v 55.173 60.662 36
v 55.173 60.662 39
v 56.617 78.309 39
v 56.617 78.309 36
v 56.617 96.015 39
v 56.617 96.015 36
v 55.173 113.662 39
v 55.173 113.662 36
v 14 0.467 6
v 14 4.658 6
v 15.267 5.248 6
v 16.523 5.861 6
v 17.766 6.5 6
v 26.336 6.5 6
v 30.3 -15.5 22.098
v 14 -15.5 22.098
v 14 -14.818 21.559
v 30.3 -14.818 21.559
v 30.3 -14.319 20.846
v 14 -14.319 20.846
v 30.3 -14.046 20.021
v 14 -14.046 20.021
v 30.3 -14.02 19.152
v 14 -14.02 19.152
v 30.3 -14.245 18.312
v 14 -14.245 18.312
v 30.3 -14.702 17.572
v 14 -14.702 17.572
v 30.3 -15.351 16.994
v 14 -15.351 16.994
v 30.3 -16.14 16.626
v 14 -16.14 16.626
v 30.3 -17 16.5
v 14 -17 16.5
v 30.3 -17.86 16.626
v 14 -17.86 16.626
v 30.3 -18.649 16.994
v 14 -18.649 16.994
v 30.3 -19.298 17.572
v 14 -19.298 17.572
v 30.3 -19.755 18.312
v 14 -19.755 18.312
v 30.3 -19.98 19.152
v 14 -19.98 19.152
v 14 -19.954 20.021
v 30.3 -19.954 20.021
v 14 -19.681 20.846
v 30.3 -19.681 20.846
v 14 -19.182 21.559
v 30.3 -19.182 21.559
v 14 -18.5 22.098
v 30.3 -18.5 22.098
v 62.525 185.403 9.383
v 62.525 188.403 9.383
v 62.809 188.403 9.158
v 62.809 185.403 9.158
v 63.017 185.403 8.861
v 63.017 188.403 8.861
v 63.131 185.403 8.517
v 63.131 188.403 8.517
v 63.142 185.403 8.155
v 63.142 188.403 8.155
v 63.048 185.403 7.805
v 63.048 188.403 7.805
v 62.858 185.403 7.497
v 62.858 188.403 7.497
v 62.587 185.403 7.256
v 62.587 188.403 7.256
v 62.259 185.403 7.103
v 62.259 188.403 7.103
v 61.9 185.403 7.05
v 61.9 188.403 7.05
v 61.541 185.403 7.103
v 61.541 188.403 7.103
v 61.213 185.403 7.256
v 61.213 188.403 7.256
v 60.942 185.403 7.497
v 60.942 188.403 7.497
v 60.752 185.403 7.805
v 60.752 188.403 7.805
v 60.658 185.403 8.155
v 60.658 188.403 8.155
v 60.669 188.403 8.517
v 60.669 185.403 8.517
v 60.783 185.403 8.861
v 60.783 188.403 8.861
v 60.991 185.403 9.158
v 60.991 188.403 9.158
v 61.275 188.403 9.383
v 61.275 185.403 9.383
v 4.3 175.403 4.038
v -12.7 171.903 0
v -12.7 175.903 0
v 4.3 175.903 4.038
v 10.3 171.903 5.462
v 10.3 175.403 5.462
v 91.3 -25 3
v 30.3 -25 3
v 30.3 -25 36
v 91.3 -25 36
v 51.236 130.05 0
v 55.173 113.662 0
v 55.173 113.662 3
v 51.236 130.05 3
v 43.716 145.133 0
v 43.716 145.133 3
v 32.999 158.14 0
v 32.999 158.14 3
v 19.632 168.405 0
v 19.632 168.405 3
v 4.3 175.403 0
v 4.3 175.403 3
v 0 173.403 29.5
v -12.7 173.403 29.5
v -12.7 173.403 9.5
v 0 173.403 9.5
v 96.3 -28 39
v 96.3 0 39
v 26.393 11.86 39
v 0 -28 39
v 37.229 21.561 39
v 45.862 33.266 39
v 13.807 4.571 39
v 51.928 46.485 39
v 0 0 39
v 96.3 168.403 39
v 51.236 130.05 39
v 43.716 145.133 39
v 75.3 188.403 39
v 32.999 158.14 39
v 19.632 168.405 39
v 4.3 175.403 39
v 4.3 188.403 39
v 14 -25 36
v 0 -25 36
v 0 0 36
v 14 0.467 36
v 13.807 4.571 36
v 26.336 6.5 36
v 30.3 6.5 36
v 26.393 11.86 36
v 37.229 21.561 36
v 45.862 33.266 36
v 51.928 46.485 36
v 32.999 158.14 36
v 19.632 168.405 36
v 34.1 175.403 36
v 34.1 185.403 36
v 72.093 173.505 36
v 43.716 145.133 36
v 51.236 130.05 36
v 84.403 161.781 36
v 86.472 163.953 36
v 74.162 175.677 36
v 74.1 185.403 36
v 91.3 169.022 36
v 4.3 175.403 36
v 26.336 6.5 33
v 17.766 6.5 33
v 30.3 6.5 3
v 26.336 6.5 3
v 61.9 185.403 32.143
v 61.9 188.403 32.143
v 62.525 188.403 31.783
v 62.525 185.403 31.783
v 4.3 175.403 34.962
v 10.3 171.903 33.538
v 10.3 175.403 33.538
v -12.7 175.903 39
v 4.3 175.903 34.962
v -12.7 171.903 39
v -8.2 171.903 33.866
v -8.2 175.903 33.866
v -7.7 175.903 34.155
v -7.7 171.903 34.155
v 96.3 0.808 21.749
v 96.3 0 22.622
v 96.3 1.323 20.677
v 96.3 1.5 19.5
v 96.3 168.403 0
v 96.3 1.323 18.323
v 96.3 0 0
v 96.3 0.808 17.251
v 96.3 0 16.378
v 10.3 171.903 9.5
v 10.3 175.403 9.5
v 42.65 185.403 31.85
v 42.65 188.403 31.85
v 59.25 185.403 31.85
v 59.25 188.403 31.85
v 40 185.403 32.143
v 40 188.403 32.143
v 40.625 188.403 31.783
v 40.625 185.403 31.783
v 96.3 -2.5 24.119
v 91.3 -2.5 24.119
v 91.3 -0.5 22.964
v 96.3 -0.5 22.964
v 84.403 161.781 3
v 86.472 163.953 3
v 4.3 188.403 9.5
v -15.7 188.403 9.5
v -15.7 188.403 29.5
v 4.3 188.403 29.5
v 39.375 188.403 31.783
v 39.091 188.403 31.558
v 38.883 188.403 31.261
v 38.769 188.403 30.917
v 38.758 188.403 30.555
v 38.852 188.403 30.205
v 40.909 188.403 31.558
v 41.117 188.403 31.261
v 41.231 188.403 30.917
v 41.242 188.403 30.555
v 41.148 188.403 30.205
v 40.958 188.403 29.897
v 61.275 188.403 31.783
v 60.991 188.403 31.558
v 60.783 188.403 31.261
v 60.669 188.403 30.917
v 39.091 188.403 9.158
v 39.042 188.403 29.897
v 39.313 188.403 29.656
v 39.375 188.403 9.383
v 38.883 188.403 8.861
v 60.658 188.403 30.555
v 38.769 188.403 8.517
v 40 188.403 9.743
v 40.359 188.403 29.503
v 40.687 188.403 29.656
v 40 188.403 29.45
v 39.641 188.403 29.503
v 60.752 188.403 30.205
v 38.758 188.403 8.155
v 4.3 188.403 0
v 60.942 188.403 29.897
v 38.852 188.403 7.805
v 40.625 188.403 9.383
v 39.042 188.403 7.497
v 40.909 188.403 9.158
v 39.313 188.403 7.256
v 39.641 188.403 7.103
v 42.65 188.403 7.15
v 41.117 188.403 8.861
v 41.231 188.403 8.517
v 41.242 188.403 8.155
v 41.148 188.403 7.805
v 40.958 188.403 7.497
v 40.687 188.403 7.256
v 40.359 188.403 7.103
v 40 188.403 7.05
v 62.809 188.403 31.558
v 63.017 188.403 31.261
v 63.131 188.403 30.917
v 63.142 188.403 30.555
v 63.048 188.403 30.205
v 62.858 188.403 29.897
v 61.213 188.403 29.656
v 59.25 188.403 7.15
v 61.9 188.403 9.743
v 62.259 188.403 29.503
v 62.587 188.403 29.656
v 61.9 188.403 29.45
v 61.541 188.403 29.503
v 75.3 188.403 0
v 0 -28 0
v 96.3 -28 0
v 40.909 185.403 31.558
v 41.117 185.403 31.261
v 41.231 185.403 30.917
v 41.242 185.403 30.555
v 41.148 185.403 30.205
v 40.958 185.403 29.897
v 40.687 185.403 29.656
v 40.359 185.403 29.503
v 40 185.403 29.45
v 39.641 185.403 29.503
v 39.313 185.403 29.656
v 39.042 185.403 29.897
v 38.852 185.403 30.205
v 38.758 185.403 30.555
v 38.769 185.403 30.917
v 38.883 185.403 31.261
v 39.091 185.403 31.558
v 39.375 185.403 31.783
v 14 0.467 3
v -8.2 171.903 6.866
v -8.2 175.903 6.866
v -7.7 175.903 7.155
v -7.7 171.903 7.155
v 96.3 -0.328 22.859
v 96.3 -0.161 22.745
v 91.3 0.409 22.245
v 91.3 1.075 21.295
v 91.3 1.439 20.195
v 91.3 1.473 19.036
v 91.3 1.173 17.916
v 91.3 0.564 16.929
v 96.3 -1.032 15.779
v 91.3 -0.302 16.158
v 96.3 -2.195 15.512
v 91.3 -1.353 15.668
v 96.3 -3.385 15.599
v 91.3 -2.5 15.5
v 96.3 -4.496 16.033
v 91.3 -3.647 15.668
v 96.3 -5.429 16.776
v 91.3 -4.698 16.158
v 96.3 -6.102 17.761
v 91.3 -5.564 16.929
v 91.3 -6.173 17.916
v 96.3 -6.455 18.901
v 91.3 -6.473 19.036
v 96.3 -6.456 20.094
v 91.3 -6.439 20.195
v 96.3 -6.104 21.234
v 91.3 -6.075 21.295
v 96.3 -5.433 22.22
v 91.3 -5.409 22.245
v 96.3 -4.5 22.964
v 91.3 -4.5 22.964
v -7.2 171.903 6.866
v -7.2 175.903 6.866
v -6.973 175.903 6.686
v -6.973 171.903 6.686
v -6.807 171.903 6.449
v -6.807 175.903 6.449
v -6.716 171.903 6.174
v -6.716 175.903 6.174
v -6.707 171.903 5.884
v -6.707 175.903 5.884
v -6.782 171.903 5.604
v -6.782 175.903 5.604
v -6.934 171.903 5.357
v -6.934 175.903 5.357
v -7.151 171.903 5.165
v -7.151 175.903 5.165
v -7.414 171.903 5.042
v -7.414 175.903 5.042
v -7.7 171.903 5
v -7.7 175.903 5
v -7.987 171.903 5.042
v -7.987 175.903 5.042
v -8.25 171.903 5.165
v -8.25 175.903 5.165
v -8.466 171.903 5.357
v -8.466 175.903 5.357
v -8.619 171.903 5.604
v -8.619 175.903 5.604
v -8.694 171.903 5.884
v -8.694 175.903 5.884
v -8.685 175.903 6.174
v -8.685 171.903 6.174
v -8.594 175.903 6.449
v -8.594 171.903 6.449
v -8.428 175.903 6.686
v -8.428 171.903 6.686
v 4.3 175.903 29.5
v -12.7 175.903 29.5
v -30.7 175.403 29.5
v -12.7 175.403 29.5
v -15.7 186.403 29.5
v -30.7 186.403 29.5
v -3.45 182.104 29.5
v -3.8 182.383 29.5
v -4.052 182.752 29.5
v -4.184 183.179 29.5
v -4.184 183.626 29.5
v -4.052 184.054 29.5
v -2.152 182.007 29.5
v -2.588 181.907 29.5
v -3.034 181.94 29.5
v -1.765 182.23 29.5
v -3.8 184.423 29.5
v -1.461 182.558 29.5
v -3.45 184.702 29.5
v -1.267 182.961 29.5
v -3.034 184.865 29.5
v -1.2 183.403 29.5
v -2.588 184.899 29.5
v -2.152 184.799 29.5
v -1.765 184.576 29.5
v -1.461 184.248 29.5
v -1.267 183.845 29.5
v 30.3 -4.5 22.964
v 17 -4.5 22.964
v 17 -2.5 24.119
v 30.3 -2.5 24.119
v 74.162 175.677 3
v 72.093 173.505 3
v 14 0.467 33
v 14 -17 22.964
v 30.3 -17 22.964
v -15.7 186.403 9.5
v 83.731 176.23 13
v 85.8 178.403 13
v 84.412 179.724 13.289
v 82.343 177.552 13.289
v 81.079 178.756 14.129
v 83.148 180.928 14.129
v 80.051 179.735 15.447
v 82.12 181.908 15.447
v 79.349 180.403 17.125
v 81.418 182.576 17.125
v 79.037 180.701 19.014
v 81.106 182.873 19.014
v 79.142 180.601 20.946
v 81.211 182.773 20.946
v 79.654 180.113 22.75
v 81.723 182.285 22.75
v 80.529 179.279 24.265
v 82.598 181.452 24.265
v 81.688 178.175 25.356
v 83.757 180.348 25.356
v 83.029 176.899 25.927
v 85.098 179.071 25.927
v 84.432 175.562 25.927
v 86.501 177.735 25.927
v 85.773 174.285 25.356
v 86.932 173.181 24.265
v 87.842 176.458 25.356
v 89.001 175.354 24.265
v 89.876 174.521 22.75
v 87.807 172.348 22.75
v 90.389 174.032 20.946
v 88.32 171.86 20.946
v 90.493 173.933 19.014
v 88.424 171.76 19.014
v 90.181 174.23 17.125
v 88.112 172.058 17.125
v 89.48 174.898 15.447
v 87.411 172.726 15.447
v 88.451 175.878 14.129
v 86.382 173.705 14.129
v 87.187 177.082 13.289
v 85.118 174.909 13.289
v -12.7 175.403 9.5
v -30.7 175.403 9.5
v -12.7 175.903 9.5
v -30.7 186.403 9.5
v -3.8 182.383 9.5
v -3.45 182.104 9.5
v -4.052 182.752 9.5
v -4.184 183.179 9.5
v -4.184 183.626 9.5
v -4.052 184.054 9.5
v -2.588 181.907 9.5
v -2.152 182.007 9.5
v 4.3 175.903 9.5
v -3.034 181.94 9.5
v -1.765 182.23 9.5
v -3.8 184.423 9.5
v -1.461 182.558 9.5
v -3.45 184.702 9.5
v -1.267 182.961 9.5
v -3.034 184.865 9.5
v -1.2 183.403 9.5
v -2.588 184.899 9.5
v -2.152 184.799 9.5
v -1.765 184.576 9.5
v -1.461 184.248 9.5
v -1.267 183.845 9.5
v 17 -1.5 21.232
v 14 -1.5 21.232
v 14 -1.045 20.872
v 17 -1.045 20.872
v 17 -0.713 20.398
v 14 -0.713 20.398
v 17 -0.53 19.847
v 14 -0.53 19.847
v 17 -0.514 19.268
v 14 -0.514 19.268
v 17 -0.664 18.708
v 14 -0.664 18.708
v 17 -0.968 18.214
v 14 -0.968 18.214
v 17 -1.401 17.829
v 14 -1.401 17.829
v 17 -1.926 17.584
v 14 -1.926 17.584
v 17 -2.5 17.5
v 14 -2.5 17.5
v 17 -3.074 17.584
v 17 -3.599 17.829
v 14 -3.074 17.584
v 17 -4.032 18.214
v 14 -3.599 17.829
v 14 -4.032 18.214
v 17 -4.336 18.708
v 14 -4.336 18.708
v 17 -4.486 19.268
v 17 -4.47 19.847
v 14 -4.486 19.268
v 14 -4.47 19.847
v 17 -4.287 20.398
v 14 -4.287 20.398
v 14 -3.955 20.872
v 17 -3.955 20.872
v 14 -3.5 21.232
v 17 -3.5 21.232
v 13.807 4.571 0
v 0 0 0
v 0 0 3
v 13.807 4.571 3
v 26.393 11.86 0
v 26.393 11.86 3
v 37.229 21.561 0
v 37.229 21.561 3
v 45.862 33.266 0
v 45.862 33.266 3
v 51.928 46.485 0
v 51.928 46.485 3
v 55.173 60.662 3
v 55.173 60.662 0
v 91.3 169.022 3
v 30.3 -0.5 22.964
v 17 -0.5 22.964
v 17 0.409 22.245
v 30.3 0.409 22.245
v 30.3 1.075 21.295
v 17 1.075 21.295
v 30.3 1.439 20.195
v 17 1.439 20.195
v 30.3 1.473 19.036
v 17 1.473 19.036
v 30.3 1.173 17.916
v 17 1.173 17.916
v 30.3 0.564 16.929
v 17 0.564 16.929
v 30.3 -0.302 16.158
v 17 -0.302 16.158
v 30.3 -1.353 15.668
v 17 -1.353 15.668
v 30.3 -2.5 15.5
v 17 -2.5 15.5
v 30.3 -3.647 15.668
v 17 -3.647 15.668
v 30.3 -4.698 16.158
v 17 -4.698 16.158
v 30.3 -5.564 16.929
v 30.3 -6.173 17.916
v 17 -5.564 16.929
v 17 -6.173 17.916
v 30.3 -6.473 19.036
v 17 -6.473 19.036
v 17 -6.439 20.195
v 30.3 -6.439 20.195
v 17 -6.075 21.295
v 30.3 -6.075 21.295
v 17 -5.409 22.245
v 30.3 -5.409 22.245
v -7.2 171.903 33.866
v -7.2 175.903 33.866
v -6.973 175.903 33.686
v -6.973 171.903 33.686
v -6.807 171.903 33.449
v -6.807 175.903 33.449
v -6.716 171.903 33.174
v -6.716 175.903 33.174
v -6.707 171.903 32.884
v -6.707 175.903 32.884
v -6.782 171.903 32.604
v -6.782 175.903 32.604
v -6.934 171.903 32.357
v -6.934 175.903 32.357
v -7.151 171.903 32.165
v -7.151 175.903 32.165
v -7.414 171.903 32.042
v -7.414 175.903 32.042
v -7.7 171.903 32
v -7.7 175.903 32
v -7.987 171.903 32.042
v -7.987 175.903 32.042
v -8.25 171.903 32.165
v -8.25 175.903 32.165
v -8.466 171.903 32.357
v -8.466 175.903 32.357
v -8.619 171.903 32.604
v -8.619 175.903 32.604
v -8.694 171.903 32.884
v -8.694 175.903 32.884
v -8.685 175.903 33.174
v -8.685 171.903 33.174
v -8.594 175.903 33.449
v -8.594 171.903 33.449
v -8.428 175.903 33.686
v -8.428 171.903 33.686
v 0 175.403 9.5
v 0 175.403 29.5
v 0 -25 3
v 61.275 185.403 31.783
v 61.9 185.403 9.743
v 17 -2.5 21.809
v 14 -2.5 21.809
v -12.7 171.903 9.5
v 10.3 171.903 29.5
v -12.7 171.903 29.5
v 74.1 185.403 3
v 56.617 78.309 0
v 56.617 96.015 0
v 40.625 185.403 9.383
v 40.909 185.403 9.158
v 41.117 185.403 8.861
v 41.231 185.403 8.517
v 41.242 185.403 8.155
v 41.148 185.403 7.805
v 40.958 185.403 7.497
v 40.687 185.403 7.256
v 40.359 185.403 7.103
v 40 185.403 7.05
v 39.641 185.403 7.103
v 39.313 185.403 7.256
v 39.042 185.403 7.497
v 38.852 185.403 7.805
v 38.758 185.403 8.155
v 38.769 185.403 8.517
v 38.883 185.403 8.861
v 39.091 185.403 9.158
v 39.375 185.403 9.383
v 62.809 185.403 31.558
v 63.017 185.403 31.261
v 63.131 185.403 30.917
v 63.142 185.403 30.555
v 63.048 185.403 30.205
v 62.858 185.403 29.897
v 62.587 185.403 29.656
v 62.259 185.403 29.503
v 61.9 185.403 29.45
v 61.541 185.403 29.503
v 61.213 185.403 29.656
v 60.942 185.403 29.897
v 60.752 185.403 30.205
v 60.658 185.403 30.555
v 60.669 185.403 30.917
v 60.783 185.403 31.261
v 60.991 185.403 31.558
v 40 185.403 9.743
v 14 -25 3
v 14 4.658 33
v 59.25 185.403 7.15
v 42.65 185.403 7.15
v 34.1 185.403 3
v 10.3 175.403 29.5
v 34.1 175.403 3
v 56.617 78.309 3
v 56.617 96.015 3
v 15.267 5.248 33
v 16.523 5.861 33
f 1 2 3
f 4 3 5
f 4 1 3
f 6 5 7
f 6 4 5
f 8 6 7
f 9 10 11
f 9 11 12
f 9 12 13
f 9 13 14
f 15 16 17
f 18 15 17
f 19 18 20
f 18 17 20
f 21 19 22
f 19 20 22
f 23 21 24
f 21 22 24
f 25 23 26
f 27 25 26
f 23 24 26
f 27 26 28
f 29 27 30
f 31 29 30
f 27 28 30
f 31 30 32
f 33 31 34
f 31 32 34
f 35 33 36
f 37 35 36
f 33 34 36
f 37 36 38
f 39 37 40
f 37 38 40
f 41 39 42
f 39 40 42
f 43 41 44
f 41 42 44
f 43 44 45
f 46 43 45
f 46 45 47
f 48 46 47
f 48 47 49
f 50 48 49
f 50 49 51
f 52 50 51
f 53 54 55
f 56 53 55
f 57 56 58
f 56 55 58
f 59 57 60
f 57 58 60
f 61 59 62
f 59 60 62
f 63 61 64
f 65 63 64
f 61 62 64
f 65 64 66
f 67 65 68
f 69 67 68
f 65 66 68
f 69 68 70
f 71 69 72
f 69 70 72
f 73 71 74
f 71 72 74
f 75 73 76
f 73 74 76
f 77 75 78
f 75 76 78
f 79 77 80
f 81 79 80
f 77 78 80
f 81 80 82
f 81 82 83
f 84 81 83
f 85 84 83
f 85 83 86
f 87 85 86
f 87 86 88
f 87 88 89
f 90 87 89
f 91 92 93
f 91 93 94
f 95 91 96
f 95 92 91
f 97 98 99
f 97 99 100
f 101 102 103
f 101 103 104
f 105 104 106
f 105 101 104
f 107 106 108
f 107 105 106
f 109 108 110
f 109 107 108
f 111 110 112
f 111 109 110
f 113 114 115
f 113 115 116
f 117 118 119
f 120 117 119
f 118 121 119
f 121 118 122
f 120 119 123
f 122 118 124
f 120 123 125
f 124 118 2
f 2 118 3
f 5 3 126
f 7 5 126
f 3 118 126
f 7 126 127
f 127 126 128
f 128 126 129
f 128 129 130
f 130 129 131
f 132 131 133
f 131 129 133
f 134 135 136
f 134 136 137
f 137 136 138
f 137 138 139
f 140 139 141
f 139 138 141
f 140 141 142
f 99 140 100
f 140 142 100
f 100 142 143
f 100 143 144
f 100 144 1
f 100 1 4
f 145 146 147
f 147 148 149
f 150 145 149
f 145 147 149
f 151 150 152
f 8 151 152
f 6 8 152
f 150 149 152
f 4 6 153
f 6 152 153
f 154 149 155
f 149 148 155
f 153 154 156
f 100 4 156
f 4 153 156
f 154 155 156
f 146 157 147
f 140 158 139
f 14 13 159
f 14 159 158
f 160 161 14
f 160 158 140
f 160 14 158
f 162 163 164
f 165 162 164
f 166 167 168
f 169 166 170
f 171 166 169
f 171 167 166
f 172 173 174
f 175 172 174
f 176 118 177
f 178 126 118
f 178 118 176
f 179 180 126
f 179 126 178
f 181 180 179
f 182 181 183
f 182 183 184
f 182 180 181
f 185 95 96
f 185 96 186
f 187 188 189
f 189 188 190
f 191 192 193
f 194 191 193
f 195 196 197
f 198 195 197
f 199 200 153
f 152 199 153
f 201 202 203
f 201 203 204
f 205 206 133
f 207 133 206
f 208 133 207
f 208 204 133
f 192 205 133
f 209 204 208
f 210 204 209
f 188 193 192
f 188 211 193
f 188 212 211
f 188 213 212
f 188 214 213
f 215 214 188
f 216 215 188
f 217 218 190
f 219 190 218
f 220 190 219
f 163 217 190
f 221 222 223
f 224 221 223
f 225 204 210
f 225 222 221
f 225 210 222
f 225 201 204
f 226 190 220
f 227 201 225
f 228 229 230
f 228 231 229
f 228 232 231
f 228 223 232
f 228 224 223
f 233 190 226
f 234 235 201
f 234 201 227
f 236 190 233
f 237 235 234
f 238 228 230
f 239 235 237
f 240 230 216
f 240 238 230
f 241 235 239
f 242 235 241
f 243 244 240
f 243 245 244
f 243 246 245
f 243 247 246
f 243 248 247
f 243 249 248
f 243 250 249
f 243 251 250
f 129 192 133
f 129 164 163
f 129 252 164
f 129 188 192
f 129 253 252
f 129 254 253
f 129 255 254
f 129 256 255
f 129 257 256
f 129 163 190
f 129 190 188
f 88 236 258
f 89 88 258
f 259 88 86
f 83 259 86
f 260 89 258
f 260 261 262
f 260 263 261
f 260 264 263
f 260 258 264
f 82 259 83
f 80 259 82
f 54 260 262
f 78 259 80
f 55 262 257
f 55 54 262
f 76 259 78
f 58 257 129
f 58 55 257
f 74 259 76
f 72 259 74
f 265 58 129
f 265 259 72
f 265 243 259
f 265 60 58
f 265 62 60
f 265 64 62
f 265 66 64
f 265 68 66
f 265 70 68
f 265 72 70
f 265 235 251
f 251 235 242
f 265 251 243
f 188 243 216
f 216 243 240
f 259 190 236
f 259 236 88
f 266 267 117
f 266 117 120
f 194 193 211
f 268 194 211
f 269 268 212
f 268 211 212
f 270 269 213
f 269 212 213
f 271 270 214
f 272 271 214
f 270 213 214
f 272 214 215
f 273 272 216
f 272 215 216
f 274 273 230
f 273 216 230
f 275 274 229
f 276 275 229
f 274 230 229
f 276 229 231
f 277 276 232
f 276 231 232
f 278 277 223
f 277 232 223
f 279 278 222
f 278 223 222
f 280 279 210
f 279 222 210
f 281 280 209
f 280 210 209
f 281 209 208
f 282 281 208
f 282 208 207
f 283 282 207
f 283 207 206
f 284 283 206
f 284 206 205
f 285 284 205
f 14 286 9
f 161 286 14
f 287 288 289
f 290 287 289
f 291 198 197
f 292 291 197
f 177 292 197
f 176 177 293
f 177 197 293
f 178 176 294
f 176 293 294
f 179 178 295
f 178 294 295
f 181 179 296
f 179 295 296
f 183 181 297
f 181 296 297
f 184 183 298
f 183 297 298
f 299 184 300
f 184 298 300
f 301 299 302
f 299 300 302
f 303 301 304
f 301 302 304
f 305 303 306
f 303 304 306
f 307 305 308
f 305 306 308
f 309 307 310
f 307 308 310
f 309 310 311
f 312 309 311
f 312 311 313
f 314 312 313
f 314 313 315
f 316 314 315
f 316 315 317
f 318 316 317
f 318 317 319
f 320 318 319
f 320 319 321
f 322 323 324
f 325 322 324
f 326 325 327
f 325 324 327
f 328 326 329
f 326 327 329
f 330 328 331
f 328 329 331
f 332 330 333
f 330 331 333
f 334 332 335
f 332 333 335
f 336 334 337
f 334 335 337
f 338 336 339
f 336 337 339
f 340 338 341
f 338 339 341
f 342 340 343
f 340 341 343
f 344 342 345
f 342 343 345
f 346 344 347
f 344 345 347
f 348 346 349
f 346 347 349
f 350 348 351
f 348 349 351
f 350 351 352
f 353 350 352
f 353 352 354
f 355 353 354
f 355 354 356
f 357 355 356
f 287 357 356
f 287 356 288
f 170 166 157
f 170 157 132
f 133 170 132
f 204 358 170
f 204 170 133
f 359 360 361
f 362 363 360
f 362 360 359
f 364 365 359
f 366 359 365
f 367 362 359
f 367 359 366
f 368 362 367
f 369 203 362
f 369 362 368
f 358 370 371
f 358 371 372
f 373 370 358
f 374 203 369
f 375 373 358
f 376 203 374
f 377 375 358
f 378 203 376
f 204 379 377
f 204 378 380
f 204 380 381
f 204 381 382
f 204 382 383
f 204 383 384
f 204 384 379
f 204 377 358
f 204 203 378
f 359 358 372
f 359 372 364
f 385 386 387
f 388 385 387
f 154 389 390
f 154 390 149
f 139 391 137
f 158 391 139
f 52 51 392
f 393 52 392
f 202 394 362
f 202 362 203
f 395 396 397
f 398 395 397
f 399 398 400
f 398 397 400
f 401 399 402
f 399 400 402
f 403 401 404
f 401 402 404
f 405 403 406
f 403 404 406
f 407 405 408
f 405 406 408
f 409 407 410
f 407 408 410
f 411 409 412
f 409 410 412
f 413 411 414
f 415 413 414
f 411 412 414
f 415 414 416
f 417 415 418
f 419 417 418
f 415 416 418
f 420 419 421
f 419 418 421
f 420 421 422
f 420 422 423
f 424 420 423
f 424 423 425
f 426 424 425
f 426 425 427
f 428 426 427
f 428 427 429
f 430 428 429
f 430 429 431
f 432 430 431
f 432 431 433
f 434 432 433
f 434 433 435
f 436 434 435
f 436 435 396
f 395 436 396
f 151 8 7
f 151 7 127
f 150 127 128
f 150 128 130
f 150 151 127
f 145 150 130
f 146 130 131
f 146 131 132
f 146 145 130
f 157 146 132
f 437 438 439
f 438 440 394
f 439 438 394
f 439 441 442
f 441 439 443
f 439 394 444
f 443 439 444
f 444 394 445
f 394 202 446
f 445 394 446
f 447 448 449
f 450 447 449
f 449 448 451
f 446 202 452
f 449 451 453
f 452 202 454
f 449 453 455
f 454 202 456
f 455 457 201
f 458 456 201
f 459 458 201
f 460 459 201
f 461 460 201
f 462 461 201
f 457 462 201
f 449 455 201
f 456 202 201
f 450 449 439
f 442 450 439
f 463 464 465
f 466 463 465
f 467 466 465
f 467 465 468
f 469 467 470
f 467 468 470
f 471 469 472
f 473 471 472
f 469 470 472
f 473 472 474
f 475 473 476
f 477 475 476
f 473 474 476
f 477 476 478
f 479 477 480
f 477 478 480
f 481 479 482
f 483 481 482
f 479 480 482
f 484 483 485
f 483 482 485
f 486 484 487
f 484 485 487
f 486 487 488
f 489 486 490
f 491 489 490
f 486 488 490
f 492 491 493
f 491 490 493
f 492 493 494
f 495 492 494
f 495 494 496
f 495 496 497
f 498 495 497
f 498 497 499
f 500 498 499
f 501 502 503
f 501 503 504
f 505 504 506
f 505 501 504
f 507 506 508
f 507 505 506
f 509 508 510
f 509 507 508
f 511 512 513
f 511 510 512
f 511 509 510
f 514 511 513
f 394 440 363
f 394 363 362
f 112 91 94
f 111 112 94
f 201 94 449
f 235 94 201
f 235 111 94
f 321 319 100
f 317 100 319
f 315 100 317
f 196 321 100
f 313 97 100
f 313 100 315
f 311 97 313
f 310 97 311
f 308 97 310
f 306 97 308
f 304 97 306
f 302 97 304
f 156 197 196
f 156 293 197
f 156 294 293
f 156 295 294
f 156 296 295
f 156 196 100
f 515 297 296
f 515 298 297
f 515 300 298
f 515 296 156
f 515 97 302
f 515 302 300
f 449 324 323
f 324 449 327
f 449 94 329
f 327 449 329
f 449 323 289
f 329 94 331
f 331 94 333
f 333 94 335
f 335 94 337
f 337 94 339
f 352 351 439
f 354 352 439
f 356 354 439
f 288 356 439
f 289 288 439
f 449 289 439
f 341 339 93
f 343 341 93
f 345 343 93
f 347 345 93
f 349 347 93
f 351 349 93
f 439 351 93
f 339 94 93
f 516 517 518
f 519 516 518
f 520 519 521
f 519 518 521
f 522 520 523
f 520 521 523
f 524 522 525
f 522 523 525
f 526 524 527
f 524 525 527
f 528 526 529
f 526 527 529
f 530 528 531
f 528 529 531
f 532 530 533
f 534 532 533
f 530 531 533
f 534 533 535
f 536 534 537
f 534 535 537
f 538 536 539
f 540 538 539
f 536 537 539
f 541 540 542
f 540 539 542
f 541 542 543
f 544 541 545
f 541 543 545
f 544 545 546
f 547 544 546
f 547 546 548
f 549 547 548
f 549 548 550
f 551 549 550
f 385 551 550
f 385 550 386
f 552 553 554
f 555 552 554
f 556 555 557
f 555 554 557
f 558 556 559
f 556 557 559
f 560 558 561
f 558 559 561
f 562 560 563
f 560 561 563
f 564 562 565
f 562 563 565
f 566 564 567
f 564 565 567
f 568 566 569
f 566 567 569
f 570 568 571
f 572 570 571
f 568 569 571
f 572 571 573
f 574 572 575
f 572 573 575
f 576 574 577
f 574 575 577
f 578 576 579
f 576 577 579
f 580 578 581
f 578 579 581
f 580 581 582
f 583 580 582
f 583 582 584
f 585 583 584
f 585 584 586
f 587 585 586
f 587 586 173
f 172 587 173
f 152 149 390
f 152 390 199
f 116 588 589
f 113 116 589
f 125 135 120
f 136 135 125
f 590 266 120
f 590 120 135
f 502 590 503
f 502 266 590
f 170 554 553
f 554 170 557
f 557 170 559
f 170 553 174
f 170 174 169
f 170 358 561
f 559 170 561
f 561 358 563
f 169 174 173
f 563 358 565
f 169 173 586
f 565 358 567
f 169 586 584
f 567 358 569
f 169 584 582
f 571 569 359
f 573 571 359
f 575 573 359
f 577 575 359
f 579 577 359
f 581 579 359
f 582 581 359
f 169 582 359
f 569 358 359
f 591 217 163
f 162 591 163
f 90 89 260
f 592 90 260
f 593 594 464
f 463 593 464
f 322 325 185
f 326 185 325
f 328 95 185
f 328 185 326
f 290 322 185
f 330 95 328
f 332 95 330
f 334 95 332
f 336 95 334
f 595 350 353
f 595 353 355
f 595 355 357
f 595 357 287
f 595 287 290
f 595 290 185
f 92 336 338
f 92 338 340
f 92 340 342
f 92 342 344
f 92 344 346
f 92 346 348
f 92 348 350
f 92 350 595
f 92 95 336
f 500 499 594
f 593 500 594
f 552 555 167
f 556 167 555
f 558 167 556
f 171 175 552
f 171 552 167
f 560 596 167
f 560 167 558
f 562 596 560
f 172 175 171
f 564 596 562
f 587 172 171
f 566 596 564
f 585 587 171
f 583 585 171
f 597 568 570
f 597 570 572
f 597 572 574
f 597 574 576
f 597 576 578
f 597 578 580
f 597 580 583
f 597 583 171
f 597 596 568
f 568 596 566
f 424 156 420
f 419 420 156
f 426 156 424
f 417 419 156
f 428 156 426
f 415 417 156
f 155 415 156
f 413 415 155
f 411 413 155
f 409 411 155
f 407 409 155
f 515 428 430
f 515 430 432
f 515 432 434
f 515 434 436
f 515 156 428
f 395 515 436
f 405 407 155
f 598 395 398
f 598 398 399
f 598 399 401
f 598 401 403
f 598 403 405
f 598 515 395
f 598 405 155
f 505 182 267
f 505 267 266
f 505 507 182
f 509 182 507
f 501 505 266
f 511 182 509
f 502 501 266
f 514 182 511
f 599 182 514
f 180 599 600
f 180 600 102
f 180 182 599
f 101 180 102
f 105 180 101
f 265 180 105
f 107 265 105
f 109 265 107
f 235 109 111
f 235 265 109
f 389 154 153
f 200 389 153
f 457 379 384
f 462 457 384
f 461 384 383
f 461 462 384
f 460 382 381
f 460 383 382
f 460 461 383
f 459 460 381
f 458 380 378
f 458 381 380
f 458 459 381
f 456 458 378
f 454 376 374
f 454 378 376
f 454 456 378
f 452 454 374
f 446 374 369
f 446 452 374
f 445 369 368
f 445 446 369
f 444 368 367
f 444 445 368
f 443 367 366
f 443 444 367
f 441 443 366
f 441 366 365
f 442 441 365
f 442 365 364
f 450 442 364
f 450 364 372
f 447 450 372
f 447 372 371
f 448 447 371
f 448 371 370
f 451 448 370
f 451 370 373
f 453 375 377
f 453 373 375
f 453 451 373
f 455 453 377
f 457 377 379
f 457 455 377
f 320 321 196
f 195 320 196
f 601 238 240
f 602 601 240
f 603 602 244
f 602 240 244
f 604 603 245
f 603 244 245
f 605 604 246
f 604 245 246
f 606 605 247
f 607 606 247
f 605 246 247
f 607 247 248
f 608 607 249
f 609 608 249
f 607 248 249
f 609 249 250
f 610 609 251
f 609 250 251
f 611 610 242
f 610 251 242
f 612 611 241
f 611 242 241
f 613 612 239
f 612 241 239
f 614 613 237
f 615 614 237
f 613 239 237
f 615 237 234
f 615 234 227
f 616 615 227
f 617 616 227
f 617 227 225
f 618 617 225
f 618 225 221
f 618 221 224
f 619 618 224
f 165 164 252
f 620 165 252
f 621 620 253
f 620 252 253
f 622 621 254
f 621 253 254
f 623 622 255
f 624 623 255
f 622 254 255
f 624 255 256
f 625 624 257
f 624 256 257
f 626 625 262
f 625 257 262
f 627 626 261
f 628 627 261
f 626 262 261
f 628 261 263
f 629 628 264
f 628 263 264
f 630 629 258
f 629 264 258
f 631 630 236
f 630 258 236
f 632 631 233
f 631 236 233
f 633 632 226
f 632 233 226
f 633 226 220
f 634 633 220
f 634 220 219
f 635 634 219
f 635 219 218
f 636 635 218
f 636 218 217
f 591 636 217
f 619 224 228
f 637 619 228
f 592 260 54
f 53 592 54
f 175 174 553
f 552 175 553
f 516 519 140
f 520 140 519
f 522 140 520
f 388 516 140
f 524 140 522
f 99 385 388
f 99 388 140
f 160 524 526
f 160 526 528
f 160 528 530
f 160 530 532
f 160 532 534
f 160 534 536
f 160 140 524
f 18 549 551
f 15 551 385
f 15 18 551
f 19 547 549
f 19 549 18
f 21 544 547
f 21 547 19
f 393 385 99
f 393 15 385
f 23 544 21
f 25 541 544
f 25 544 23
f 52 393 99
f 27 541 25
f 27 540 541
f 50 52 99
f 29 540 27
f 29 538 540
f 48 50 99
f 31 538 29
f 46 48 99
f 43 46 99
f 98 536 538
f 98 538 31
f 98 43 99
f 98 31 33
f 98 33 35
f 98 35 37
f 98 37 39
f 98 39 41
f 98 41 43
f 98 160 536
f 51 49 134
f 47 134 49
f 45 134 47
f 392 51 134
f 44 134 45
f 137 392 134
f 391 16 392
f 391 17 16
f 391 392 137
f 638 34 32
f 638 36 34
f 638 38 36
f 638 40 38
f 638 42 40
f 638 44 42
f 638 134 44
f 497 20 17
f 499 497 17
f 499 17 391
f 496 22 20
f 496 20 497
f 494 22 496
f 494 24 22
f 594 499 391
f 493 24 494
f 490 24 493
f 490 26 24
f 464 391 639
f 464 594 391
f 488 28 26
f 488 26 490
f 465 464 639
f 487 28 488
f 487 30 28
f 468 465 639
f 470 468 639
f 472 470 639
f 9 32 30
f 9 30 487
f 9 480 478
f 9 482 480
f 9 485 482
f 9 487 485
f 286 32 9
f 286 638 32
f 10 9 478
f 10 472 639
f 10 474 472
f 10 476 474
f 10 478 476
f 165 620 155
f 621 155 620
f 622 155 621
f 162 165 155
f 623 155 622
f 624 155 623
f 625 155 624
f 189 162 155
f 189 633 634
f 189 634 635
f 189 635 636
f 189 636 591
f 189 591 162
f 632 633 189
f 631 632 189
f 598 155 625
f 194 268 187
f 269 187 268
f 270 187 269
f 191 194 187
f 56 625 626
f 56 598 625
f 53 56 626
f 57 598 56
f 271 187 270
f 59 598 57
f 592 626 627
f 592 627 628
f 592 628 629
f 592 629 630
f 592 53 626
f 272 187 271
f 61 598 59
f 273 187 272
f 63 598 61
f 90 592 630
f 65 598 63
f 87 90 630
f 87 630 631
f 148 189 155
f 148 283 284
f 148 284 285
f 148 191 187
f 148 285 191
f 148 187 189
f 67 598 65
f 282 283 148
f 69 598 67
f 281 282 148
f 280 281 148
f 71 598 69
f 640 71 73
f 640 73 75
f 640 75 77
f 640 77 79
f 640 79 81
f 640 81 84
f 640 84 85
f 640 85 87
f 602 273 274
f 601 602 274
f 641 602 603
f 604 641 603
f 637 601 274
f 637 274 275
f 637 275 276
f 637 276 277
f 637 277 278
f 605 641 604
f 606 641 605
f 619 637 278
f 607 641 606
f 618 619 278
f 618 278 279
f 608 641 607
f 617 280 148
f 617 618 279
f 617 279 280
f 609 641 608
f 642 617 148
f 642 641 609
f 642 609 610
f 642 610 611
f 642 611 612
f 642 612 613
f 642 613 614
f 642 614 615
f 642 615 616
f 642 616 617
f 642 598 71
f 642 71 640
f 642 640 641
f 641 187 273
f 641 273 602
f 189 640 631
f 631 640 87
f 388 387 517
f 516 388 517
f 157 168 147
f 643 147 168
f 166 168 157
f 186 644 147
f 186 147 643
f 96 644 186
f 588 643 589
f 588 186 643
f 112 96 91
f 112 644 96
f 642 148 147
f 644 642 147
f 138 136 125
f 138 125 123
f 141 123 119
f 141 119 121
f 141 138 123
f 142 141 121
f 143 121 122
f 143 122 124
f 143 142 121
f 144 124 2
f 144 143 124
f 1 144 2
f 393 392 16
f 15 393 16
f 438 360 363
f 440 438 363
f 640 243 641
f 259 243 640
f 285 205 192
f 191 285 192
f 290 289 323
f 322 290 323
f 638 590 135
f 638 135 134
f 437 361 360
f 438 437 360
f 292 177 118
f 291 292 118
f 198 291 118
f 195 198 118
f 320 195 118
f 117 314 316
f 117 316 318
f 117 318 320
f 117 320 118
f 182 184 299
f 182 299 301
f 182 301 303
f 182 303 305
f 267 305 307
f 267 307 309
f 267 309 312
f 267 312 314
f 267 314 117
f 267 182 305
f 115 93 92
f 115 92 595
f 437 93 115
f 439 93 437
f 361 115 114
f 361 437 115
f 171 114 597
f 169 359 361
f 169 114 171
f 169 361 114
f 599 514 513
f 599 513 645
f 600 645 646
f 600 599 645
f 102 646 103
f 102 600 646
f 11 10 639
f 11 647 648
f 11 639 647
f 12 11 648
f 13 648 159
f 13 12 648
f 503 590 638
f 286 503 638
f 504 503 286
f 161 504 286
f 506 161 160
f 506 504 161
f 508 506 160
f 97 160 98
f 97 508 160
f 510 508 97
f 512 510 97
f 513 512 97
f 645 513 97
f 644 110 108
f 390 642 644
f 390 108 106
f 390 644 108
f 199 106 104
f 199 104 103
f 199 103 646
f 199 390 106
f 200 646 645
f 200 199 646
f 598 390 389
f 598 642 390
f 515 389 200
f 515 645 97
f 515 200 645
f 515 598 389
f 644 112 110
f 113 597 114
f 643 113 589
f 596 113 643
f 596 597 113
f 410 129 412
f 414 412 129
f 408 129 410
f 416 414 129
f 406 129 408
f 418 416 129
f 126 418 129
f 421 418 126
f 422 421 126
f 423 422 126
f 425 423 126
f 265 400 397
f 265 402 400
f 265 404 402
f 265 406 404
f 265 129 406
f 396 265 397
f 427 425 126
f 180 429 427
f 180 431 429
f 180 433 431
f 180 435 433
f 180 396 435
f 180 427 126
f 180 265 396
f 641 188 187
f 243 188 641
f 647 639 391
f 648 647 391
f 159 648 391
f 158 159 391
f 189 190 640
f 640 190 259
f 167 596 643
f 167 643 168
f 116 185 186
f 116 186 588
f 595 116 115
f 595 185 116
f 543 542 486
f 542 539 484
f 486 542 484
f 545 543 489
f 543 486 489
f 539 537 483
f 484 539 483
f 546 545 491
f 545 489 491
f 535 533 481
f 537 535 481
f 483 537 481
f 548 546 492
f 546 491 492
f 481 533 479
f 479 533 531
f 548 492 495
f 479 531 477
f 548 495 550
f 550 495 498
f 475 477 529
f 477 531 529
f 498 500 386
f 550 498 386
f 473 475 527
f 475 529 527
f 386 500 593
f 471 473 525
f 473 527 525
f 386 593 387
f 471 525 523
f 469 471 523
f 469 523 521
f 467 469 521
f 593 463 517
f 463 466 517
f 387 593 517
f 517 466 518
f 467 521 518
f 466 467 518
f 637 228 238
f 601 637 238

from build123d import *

# Parameters (mm, degrees)
EXTRUDE_6_DEPTH      = 39
CUT_EXTRUDE_START    = 3
CUT_EXTRUDE_2_DEPTH  = 33
EXTRUDE_START        = 9.5
SKETCH_7_W           = 35
SKETCH_7_H           = 13
EXTRUDE_7_DEPTH      = 20
EXTRUDE_START_2      = -16.5
EXTRUDE_8_DEPTH      = 4
CUT_EXTRUDE_START_2  = 180
CUT_EXTRUDE_3_DEPTH  = 10
SKETCH_13_R          = 1.5
CUT_EXTRUDE_4_DEPTH  = 30
SKETCH_14_W          = 15
SKETCH_14_H          = 2
CUT_EXTRUDE_5_DEPTH  = 30
CUT_EXTRUDE_START_3  = 17
CUT_EXTRUDE_7_DEPTH  = 85
CUT_EXTRUDE_START_4  = 13
CUT_EXTRUDE_9_DEPTH  = 5
SKETCH_20_W          = 16.6
SKETCH_20_H          = 24.7
CUT_EXTRUDE_10_DEPTH = 5
SKETCH_21_R          = 6.5
CUT_EXTRUDE_11_DEPTH = 5
CUT_EXTRUDE_12_DEPTH = 17
CUT_EXTRUDE_13_DEPTH = 3
CUT_EXTRUDE_START_5  = 30
CUT_EXTRUDE_14_DEPTH = 3
SKETCH_26_W          = 12.700381469
SKETCH_26_H          = 20
EXTRUDE_9_DEPTH      = 2
EXTRUDE_START_3      = 7
SKETCH_27_W          = 17
SKETCH_27_H          = 33
EXTRUDE_10_DEPTH     = 3


with BuildPart() as part:
    # Эскиз1 → Бобышка-Вытянуть6 (new body)
    with BuildSketch(Plane.XY):
        with BuildLine():
            Line((4.299618531, 175.402841826), (4.299618531, 188.402841826))
            Line((4.299618531, 188.402841826), (75.299618531, 188.402841826))
            Line((75.299618531, 188.402841826), (96.299618531, 168.402841826))
            Line((96.299618531, 168.402841826), (96.299619, 0))
            Line((96.299619, 0), (96.299619, -28))
            Line((96.299619, -28), (0, -28))
            Line((0, -28), (0, 0))
            ThreePointArc((0, 0), (37.229295141, 21.561020186), (55.173142182, 60.662380285))
            ThreePointArc((55.173142182, 60.662380285), (56.797307883, 87.162380285), (55.173142182, 113.662380285))
            ThreePointArc((55.173142182, 113.662380285), (38.726552267, 151.940422917), (4.299618531, 175.402841826))
        make_face()
    extrude(amount=EXTRUDE_6_DEPTH)

    # Эскиз5 → Вырез-Вытянуть2 (cut)
    with BuildSketch(Plane.XY.offset(CUT_EXTRUDE_START)):
        Polygon((34.099618531, 175.402841826), (4.299618531, 175.402841826), (4.299618531, 169.021888999), (-18.700381469, 169.021888999), (-18.700381469, -25), (14, -25), (14, 6.5), (30.299619, 6.5), (30.299619, -25), (91.299619, -25), (91.299619, 169.021888999), (74.099618531, 185.402841826), (34.099618531, 185.402841826), align=None)
    extrude(amount=CUT_EXTRUDE_2_DEPTH, mode=Mode.SUBTRACT)

    # Эскиз7 → Бобышка-Вытянуть7 (add)
    with BuildSketch(Plane.XY.offset(EXTRUDE_START)):
        with Locations((-13.200381469, 181.902841826)):
            Rectangle(SKETCH_7_W, SKETCH_7_H)
    extrude(amount=EXTRUDE_7_DEPTH)

    # Эскиз22 → Бобышка-Вытянуть8 (add)
    with BuildSketch(Plane(origin=(0, 188.402841826, 0), x_dir=(1, 0, 0), z_dir=(0, 1, 0)).offset(EXTRUDE_START_2)):
        Polygon((10.299618531, -29.5), (10.299618531, -33.5375), (-12.700381469, -39), (-12.700381469, -29.5), align=None)
        Polygon((-12.700381469, -9.5), (-12.700381469, 0), (10.299618531, -5.4625), (10.299618531, -9.5), align=None)
    extrude(amount=EXTRUDE_8_DEPTH)

    # Эскиз12 → Вырез-Вытянуть3 (cut)
    with BuildSketch(Plane(origin=(0, 0, 0), x_dir=(1, 0, 0), z_dir=(0, 1, 0)).offset(CUT_EXTRUDE_START_2)):
        with BuildLine():
            Line((-7.700381469, -34.154700538), (-7.200381469, -33.866025404))
            ThreePointArc((-7.200381469, -33.866025404), (-7.700381469, -32), (-8.200381469, -33.866025404))
            Line((-8.200381469, -33.866025404), (-7.700381469, -34.154700538))
        make_face()
        with BuildLine():
            Line((-7.700381469, -7.154700538), (-7.200381469, -6.866025404))
            ThreePointArc((-7.200381469, -6.866025404), (-7.700381469, -5), (-8.200381469, -6.866025404))
            Line((-8.200381469, -6.866025404), (-7.700381469, -7.154700538))
        make_face()
    extrude(amount=-CUT_EXTRUDE_3_DEPTH, mode=Mode.SUBTRACT)

    # Эскиз13 → Вырез-Вытянуть4 (cut)
    with BuildSketch(Plane.XY):
        with Locations((-2.700381469, 183.402841826)):
            Circle(SKETCH_13_R)
    extrude(amount=CUT_EXTRUDE_4_DEPTH, mode=Mode.SUBTRACT)

    # Эскиз14 → Вырез-Вытянуть5 (cut)
    with BuildSketch(Plane.XY):
        with Locations((-23.200381469, 187.402841826)):
            Rectangle(SKETCH_14_W, SKETCH_14_H)
    extrude(amount=CUT_EXTRUDE_5_DEPTH, mode=Mode.SUBTRACT)

    # Эскиз17 → Вырез-Вытянуть7 (cut)
    with BuildSketch(Plane(origin=(0, 0, 0), x_dir=(0, 0, -1), z_dir=(1, 0, 0)).offset(CUT_EXTRUDE_START_3)):
        with BuildLine():
            Line((-24.118802154, -2.5), (-22.964101615, -0.5))
            ThreePointArc((-22.964101615, -0.5), (-15.5, -2.5), (-22.964101615, -4.5))
            Line((-22.964101615, -4.5), (-24.118802154, -2.5))
        make_face()
    extrude(amount=CUT_EXTRUDE_7_DEPTH, mode=Mode.SUBTRACT)

    # Эскиз18 → Вырез-Вытянуть9 (cut)
    with BuildSketch(Plane(origin=(0, 0, 0), x_dir=(0, 0, -1), z_dir=(1, 0, 0)).offset(CUT_EXTRUDE_START_4)):
        with BuildLine():
            Line((-21.809401077, -2.5), (-21.232050808, -1.5))
            ThreePointArc((-21.232050808, -1.5), (-17.5, -2.5), (-21.232050808, -3.5))
            Line((-21.232050808, -3.5), (-21.809401077, -2.5))
        make_face()
    extrude(amount=CUT_EXTRUDE_9_DEPTH, mode=Mode.SUBTRACT)

    # Эскиз20 → Вырез-Вытянуть10 (cut)
    with BuildSketch(Plane(origin=(0, 188.402841826, 0), x_dir=(1, 0, 0), z_dir=(0, 1, 0))):
        with Locations((50.95, -19.5)):
            Rectangle(SKETCH_20_W, SKETCH_20_H)
        with BuildLine():
            Line((40, -32.143375673), (40.625, -31.782531755))
            ThreePointArc((40.625, -31.782531755), (40, -29.45), (39.375, -31.782531755))
            Line((39.375, -31.782531755), (40, -32.143375673))
        make_face()
        with BuildLine():
            Line((40, -9.743375673), (40.625, -9.382531755))
            ThreePointArc((40.625, -9.382531755), (40, -7.05), (39.375, -9.382531755))
            Line((39.375, -9.382531755), (40, -9.743375673))
        make_face()
        with BuildLine():
            Line((61.9, -9.743375673), (62.525, -9.382531755))
            ThreePointArc((62.525, -9.382531755), (61.9, -7.05), (61.275, -9.382531755))
            Line((61.275, -9.382531755), (61.9, -9.743375673))
        make_face()
        with BuildLine():
            Line((61.9, -32.143375673), (62.525, -31.782531755))
            ThreePointArc((62.525, -31.782531755), (61.9, -29.45), (61.275, -31.782531755))
            Line((61.275, -31.782531755), (61.9, -32.143375673))
        make_face()
    extrude(amount=-CUT_EXTRUDE_10_DEPTH, mode=Mode.SUBTRACT)

    # Эскиз21 → Вырез-Вытянуть11 (cut)
    with BuildSketch(Plane(origin=(129.903734815, 136.398921556, 0), x_dir=(0, 0, -1), z_dir=(0.689655172, 0.724137931, 0))):
        with Locations((-19.5, 60.905684392)):
            Circle(SKETCH_21_R)
    extrude(amount=-CUT_EXTRUDE_11_DEPTH, mode=Mode.SUBTRACT)

    # Эскиз23 → Вырез-Вытянуть12 (cut)
    with BuildSketch(Plane.ZY.offset(-14)):
        with BuildLine():
            Line((22.964101615, -17), (22.098076211, -15.5))
            ThreePointArc((22.098076211, -15.5), (16.5, -17), (22.098076211, -18.5))
            Line((22.098076211, -18.5), (22.964101615, -17))
        make_face()
    extrude(amount=-CUT_EXTRUDE_12_DEPTH, mode=Mode.SUBTRACT)

    # Эскиз24 → Вырез-Вытянуть13 (cut)
    with BuildSketch(Plane.XY.offset(3)):
        Polygon((11, -1), (27.169940805, 6.907781886), (23.655371078, 14.094422244), (7.485430273, 6.186640358), align=None)
    extrude(amount=CUT_EXTRUDE_13_DEPTH, mode=Mode.SUBTRACT)

    # Эскиз25 → Вырез-Вытянуть14 (cut)
    with BuildSketch(Plane.XY.offset(3).offset(CUT_EXTRUDE_START_5)):
        Polygon((11, -1), (27.169940805, 6.907781886), (23.655371078, 14.094422244), (7.485430273, 6.186640358), align=None)
    extrude(amount=CUT_EXTRUDE_14_DEPTH, mode=Mode.SUBTRACT)

    # Эскиз26 → Бобышка-Вытянуть9 (add)
    with BuildSketch(Plane.XZ.offset(-175.402841826)):
        with Locations((-6.350190735, 19.5)):
            Rectangle(SKETCH_26_W, SKETCH_26_H)
    extrude(amount=EXTRUDE_9_DEPTH)

    # Эскиз27 → Бобышка-Вытянуть10 (add)
    with BuildSketch(Plane(origin=(127.834769298, 134.226507763, 0), x_dir=(0.724137931, -0.689655172, 0), z_dir=(-0.689655172, -0.724137931, 0)).offset(EXTRUDE_START_3)):
        with Locations((-58.953302792, 19.5)):
            Rectangle(SKETCH_27_W, SKETCH_27_H)
    extrude(amount=EXTRUDE_10_DEPTH)


solid = part.part
